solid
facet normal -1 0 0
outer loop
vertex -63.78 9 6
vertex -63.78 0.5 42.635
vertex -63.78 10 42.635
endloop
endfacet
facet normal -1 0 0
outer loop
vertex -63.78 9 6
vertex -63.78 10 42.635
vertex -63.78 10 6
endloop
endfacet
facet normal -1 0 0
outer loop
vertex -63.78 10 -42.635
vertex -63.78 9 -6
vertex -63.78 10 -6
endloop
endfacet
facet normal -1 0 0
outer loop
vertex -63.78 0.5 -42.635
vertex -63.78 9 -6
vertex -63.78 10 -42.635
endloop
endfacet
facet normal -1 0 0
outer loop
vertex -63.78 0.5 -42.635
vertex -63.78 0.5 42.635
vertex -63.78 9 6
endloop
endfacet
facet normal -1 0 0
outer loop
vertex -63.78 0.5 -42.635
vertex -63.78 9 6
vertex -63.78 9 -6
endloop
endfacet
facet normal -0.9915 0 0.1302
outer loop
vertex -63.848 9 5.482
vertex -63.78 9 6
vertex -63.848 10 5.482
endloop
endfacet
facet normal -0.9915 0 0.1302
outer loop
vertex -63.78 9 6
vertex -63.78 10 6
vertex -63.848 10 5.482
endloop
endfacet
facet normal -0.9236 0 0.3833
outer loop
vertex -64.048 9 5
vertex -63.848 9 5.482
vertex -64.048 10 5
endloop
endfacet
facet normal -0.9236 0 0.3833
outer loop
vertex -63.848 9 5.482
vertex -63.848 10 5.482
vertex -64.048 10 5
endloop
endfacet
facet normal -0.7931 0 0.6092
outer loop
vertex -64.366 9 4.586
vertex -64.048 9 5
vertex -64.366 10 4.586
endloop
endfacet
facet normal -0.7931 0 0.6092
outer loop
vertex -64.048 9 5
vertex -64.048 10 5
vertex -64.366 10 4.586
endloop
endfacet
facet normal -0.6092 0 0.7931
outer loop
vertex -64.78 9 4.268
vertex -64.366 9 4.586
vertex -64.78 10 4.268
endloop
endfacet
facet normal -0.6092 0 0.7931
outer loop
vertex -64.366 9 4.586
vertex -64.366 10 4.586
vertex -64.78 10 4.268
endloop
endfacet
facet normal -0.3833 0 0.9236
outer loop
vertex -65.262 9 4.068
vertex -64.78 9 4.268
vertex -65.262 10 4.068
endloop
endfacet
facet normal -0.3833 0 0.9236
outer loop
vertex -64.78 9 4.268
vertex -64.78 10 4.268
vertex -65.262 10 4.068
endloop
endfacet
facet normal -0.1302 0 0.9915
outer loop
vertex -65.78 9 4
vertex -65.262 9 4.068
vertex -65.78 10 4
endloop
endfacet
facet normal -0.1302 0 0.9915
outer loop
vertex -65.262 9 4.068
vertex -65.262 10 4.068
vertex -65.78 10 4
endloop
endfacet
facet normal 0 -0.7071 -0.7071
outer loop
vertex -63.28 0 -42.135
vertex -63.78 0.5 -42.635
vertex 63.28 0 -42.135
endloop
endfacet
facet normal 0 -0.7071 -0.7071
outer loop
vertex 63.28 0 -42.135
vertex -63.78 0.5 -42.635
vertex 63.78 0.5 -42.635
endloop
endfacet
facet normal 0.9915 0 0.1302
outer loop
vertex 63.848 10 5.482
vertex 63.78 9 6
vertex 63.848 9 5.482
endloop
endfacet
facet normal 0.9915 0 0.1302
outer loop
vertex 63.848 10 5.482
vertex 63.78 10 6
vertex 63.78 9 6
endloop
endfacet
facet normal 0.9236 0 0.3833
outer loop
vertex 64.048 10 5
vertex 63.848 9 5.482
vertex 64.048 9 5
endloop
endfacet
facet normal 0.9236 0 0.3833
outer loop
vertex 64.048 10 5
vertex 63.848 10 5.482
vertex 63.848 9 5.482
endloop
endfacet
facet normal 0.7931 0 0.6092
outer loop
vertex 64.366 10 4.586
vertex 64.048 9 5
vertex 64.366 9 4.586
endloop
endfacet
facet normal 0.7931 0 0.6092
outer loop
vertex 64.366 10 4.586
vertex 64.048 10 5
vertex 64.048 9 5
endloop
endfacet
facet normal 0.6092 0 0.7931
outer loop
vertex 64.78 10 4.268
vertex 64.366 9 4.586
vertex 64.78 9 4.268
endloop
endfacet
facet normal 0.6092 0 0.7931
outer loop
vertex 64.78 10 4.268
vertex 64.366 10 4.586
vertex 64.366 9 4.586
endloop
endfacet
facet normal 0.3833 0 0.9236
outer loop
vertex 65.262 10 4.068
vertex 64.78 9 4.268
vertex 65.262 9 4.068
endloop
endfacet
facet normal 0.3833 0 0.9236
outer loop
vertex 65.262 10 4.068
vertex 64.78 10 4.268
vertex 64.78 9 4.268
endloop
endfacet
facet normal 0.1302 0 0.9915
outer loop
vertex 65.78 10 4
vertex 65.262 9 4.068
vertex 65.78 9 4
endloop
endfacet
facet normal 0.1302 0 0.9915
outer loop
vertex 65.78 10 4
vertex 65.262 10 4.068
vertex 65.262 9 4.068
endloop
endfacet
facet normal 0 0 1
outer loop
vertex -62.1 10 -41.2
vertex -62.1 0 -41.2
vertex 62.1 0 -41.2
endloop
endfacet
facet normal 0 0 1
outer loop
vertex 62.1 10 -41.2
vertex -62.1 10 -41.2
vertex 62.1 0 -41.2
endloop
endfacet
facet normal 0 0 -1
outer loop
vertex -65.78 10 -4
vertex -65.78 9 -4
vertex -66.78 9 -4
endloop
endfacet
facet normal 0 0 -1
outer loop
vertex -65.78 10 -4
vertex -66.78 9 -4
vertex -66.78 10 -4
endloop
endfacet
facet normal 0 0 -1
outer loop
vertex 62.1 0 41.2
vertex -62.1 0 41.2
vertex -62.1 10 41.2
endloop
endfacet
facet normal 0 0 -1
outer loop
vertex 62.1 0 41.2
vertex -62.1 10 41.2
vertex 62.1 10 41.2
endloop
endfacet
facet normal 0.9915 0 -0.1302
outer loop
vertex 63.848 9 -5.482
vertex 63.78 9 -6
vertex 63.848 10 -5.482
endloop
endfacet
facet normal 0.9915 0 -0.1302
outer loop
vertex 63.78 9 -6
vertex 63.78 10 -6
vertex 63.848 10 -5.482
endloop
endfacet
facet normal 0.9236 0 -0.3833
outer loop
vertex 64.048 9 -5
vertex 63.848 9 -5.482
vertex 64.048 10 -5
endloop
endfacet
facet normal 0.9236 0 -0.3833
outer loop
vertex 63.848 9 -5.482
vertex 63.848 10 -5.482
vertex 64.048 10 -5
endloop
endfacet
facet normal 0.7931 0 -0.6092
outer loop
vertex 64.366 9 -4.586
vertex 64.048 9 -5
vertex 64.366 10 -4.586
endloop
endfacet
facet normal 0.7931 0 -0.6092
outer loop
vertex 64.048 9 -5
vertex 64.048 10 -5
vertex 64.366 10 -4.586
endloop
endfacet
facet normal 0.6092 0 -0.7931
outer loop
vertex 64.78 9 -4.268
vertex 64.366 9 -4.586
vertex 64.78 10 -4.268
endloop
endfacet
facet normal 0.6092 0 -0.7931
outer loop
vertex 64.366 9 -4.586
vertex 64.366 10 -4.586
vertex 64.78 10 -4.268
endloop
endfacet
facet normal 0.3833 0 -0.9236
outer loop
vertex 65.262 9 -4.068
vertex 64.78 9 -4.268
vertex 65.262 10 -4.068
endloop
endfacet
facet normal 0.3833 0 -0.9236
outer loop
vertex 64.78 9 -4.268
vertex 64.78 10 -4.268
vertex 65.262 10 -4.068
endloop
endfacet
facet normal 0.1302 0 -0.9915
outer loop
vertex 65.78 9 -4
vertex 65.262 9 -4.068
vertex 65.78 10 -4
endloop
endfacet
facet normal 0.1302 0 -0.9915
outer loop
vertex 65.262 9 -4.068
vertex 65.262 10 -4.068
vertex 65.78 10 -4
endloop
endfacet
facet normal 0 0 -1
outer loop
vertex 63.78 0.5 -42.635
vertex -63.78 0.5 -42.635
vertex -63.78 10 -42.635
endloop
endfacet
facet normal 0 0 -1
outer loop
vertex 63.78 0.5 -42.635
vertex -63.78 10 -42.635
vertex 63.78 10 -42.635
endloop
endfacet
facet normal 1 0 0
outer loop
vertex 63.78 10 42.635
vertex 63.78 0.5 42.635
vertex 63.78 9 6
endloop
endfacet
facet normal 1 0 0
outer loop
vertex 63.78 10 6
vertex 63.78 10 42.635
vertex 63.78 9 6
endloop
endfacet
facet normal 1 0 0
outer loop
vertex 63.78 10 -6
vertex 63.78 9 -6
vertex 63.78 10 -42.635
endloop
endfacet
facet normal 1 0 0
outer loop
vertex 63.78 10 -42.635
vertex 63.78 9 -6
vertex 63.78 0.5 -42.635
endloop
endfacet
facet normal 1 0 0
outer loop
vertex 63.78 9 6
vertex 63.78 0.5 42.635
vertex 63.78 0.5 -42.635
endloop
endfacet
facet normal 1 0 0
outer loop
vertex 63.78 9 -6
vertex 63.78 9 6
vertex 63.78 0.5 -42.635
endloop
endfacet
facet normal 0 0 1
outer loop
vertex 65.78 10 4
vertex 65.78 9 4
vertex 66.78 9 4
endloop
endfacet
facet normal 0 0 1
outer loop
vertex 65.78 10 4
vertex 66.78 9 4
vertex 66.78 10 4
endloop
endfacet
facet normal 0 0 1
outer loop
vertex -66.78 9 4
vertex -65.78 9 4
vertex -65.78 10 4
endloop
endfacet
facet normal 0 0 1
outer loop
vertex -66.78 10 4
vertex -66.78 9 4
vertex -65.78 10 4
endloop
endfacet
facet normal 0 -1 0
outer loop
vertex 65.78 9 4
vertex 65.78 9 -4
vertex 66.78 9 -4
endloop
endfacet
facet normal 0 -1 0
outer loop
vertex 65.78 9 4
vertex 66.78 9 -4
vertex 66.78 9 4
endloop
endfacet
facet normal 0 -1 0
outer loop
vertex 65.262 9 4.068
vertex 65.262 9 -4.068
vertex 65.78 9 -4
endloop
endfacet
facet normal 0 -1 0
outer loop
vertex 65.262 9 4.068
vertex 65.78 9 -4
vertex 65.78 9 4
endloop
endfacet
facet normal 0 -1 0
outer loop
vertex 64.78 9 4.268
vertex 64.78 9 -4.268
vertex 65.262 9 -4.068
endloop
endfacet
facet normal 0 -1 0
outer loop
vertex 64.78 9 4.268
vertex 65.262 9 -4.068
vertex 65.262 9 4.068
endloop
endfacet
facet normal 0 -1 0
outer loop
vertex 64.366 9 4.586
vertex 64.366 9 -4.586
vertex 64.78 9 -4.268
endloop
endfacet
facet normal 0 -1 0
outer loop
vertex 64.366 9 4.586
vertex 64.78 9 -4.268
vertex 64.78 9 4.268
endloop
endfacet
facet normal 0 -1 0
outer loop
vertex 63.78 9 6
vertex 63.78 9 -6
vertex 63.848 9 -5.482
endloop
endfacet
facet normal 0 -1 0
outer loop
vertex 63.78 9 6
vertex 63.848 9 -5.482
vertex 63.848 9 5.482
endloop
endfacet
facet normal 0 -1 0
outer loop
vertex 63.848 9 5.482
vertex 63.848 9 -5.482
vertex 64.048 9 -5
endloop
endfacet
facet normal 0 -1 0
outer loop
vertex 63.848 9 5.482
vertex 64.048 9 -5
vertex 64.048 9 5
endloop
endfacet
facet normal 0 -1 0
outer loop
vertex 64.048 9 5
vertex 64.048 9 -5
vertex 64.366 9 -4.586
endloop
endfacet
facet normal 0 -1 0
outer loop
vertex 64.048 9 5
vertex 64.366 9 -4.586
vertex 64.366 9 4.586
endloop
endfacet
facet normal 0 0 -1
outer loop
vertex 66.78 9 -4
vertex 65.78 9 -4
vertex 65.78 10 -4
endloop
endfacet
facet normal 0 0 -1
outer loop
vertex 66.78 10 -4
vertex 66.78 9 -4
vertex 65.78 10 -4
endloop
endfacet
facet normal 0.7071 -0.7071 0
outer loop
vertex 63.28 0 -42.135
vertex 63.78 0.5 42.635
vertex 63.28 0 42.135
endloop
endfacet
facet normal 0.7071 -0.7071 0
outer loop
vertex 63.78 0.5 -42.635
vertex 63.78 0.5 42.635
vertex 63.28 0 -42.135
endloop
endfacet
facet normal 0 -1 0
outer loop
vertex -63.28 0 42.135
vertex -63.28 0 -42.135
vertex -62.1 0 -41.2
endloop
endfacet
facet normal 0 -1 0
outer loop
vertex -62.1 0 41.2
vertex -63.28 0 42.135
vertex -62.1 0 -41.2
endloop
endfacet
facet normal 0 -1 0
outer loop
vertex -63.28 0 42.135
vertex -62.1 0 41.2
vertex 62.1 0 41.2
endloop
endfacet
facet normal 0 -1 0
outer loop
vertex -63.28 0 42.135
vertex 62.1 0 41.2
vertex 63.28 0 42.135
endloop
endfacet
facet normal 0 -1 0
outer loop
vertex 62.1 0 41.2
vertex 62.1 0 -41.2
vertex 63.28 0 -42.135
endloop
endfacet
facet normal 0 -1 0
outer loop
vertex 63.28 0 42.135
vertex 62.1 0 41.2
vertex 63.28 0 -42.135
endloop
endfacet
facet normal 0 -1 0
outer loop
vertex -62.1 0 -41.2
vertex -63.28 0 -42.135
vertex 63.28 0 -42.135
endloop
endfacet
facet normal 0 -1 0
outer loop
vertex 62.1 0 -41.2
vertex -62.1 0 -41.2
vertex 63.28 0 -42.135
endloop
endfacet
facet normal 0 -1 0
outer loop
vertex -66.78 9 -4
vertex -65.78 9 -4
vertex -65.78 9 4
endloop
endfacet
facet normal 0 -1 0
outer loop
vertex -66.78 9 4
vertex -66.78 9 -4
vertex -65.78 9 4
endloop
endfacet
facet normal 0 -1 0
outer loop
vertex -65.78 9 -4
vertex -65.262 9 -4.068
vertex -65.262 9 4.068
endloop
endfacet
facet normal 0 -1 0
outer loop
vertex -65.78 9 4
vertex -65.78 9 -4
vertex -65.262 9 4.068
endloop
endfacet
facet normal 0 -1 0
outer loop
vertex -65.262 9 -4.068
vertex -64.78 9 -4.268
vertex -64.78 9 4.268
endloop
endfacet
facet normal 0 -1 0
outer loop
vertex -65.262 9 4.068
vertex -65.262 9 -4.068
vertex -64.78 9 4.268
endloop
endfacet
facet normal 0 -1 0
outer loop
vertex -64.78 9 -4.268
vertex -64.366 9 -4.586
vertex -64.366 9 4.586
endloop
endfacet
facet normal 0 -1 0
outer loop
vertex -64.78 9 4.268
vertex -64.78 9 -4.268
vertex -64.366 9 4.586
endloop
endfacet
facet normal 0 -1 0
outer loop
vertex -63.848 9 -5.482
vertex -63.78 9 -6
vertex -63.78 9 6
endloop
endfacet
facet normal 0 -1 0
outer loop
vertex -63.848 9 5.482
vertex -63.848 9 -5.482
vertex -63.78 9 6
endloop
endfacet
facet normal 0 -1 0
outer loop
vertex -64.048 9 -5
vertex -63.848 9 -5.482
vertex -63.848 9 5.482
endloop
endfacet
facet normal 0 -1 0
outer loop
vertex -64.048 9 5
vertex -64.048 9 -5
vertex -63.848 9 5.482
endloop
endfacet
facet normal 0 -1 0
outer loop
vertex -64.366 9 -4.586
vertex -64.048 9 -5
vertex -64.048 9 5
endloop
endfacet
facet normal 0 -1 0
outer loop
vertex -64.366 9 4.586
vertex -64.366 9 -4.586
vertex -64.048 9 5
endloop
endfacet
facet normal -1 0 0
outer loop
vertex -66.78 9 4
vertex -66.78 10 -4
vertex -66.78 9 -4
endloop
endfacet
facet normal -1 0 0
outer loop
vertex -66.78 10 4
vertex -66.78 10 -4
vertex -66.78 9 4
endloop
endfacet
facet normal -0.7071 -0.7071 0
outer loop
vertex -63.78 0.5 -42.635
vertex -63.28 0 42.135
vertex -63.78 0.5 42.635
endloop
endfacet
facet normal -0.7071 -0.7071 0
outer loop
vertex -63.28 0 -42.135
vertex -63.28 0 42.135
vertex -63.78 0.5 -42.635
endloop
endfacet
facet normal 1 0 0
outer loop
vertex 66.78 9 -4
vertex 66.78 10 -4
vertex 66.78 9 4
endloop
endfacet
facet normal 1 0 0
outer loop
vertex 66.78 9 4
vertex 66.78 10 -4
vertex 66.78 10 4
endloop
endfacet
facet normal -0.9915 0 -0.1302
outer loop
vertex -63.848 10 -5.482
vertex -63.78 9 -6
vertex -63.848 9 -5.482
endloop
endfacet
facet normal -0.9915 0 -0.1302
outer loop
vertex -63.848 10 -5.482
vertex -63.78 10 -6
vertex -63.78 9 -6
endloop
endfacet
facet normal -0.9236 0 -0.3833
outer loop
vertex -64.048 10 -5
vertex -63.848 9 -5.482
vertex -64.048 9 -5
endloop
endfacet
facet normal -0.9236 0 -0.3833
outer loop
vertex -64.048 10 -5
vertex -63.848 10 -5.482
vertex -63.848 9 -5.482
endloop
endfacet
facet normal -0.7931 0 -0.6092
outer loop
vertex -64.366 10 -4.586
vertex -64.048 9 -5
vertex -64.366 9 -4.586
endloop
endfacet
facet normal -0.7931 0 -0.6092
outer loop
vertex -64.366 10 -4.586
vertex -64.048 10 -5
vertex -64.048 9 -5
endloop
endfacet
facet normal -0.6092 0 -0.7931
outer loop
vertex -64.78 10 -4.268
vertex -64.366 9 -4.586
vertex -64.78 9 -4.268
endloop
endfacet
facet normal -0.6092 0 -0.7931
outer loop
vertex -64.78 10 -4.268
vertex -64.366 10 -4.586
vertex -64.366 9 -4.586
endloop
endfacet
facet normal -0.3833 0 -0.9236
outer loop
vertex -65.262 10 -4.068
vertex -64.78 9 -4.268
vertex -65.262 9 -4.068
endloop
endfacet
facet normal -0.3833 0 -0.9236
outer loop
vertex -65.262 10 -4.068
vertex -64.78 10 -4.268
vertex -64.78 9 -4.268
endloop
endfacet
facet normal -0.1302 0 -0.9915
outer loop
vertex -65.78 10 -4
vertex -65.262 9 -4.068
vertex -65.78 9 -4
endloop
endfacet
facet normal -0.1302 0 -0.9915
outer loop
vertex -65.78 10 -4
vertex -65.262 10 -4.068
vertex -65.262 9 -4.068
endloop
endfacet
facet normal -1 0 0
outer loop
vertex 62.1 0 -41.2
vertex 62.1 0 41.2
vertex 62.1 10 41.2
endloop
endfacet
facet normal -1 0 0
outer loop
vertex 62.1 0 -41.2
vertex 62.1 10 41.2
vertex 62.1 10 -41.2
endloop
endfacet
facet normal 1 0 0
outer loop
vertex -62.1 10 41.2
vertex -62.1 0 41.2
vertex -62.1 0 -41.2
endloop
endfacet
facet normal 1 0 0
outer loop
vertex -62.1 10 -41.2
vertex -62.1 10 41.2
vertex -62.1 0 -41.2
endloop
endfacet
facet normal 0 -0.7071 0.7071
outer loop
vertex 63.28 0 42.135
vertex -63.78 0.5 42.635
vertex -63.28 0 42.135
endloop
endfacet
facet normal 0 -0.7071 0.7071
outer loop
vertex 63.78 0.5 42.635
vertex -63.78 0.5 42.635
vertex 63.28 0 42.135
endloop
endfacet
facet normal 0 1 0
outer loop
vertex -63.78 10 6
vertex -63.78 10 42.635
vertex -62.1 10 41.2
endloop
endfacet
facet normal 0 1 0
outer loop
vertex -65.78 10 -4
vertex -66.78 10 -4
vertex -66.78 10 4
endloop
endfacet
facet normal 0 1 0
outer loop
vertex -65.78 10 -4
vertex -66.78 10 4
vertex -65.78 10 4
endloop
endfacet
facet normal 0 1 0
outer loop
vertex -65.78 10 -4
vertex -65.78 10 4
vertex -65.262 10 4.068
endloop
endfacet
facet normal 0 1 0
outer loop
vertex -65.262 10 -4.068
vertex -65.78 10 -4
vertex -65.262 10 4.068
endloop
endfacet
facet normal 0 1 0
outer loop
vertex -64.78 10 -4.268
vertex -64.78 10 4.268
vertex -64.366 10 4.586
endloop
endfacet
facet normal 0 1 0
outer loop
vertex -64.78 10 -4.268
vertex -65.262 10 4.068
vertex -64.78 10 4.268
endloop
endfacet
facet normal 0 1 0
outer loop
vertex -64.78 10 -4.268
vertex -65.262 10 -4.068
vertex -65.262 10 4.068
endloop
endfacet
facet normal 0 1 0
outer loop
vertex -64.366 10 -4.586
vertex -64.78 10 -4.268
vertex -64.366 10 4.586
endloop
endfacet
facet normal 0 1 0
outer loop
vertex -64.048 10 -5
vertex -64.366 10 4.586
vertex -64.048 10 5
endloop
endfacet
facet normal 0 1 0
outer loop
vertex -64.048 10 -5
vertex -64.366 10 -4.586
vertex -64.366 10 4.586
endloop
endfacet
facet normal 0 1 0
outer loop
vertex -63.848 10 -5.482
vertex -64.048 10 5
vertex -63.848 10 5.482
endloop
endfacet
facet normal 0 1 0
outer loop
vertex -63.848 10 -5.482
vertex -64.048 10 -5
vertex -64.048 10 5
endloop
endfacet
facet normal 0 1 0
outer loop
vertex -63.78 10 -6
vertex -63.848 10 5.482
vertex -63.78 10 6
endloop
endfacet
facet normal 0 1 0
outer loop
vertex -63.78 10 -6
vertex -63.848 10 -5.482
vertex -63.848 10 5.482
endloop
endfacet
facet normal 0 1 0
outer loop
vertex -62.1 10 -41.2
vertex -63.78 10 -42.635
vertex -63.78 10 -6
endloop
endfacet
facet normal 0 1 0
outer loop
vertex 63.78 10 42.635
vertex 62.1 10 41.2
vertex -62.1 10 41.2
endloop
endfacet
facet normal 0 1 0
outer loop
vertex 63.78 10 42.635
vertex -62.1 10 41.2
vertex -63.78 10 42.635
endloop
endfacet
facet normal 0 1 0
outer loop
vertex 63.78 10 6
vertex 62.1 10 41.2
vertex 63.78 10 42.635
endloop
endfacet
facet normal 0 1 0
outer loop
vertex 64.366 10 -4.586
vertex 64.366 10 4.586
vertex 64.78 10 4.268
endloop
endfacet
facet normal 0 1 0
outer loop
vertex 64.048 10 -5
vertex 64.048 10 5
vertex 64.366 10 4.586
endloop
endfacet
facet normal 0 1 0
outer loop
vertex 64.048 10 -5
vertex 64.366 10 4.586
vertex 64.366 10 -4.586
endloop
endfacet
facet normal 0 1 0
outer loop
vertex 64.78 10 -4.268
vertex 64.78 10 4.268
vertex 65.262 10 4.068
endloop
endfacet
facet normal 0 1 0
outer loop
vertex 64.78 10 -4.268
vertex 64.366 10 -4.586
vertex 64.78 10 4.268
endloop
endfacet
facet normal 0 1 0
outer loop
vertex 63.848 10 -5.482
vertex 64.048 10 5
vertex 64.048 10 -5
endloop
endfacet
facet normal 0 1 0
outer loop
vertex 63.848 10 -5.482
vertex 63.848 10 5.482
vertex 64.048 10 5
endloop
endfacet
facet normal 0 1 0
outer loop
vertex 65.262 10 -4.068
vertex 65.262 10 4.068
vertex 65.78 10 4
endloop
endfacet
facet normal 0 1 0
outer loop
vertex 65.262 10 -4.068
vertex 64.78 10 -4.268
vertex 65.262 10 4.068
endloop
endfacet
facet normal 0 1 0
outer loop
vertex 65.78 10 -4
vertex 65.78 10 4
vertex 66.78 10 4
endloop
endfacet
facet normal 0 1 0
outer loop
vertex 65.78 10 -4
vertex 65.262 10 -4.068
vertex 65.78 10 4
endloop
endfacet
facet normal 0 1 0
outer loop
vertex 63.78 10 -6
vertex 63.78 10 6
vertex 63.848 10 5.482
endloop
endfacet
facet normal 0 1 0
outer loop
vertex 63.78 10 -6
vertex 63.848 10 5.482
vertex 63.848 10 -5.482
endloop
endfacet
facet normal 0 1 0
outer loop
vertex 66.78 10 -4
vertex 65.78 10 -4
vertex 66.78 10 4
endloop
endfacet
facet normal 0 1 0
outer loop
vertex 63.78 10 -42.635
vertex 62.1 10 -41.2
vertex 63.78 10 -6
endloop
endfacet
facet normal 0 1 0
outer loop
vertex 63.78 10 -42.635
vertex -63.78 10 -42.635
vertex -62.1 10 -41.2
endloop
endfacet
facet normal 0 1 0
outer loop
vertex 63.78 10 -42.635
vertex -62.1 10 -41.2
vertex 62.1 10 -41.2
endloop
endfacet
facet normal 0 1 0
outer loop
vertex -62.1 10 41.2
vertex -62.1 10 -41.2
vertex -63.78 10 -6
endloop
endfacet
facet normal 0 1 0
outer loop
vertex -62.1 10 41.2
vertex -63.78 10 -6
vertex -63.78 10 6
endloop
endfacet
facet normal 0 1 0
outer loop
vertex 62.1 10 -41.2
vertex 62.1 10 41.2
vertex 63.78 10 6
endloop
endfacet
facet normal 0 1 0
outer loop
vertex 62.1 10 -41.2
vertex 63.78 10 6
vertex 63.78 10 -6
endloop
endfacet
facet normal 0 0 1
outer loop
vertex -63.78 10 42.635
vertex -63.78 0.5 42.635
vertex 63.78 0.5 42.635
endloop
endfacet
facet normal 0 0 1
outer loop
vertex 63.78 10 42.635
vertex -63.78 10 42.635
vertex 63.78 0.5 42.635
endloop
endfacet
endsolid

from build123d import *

# Parameters (mm, degrees)
SKETCH2_W           = 127.56
SKETCH2_H           = 85.27
SKETCH2_W_2         = 124.2
SKETCH2_H_2         = 82.4
BOSS_EXTRUDE1_DEPTH = 10
SKETCH3_W           = 8
SKETCH3_H           = 1
BOSS_EXTRUDE2_DEPTH = 3
CHAMFER1_SIZE       = 0.5
FILLET1_R           = 2


with BuildPart() as part:
    # Sketch2 → Boss-Extrude1 (new body)
    with BuildSketch(Plane(origin=(0, 0, 0), x_dir=(1, 0, 0), z_dir=(0, 1, 0))):
        Rectangle(SKETCH2_W, SKETCH2_H)
        Rectangle(SKETCH2_W_2, SKETCH2_H_2, mode=Mode.SUBTRACT)
    extrude(amount=BOSS_EXTRUDE1_DEPTH)

    # Sketch3 → Boss-Extrude2 (add)
    with BuildSketch(Plane.ZY.offset(63.78)):
        with Locations((0, 9.5)):
            Rectangle(SKETCH3_W, SKETCH3_H)
    boss_extrude2 = extrude(amount=BOSS_EXTRUDE2_DEPTH)

    # Chamfer1
    chamfer1_edges = [part.edges().sort_by_distance(p)[0] for p in [
        (0, 0, 42.635),
        (-63.78, 0, 0),
        (0, 0, -42.635),
        (63.78, 0, 0),
    ]]
    chamfer(chamfer1_edges, length=CHAMFER1_SIZE)

    # Mirror1: Boss-Extrude2 across plane
    add(boss_extrude2.mirror(Plane(origin=(0, 0, 0), x_dir=(0, 0, 1), z_dir=(1, 0, 0))))

    # Fillet1
    fillet1_edges = [part.edges().sort_by_distance(p)[0] for p in [
        (-63.78, 9.5, -4),
        (-63.78, 9.5, 4),
        (63.78, 9.5, -4),
        (63.78, 9.5, 4),
    ]]
    fillet(fillet1_edges, radius=FILLET1_R)


solid = part.part
